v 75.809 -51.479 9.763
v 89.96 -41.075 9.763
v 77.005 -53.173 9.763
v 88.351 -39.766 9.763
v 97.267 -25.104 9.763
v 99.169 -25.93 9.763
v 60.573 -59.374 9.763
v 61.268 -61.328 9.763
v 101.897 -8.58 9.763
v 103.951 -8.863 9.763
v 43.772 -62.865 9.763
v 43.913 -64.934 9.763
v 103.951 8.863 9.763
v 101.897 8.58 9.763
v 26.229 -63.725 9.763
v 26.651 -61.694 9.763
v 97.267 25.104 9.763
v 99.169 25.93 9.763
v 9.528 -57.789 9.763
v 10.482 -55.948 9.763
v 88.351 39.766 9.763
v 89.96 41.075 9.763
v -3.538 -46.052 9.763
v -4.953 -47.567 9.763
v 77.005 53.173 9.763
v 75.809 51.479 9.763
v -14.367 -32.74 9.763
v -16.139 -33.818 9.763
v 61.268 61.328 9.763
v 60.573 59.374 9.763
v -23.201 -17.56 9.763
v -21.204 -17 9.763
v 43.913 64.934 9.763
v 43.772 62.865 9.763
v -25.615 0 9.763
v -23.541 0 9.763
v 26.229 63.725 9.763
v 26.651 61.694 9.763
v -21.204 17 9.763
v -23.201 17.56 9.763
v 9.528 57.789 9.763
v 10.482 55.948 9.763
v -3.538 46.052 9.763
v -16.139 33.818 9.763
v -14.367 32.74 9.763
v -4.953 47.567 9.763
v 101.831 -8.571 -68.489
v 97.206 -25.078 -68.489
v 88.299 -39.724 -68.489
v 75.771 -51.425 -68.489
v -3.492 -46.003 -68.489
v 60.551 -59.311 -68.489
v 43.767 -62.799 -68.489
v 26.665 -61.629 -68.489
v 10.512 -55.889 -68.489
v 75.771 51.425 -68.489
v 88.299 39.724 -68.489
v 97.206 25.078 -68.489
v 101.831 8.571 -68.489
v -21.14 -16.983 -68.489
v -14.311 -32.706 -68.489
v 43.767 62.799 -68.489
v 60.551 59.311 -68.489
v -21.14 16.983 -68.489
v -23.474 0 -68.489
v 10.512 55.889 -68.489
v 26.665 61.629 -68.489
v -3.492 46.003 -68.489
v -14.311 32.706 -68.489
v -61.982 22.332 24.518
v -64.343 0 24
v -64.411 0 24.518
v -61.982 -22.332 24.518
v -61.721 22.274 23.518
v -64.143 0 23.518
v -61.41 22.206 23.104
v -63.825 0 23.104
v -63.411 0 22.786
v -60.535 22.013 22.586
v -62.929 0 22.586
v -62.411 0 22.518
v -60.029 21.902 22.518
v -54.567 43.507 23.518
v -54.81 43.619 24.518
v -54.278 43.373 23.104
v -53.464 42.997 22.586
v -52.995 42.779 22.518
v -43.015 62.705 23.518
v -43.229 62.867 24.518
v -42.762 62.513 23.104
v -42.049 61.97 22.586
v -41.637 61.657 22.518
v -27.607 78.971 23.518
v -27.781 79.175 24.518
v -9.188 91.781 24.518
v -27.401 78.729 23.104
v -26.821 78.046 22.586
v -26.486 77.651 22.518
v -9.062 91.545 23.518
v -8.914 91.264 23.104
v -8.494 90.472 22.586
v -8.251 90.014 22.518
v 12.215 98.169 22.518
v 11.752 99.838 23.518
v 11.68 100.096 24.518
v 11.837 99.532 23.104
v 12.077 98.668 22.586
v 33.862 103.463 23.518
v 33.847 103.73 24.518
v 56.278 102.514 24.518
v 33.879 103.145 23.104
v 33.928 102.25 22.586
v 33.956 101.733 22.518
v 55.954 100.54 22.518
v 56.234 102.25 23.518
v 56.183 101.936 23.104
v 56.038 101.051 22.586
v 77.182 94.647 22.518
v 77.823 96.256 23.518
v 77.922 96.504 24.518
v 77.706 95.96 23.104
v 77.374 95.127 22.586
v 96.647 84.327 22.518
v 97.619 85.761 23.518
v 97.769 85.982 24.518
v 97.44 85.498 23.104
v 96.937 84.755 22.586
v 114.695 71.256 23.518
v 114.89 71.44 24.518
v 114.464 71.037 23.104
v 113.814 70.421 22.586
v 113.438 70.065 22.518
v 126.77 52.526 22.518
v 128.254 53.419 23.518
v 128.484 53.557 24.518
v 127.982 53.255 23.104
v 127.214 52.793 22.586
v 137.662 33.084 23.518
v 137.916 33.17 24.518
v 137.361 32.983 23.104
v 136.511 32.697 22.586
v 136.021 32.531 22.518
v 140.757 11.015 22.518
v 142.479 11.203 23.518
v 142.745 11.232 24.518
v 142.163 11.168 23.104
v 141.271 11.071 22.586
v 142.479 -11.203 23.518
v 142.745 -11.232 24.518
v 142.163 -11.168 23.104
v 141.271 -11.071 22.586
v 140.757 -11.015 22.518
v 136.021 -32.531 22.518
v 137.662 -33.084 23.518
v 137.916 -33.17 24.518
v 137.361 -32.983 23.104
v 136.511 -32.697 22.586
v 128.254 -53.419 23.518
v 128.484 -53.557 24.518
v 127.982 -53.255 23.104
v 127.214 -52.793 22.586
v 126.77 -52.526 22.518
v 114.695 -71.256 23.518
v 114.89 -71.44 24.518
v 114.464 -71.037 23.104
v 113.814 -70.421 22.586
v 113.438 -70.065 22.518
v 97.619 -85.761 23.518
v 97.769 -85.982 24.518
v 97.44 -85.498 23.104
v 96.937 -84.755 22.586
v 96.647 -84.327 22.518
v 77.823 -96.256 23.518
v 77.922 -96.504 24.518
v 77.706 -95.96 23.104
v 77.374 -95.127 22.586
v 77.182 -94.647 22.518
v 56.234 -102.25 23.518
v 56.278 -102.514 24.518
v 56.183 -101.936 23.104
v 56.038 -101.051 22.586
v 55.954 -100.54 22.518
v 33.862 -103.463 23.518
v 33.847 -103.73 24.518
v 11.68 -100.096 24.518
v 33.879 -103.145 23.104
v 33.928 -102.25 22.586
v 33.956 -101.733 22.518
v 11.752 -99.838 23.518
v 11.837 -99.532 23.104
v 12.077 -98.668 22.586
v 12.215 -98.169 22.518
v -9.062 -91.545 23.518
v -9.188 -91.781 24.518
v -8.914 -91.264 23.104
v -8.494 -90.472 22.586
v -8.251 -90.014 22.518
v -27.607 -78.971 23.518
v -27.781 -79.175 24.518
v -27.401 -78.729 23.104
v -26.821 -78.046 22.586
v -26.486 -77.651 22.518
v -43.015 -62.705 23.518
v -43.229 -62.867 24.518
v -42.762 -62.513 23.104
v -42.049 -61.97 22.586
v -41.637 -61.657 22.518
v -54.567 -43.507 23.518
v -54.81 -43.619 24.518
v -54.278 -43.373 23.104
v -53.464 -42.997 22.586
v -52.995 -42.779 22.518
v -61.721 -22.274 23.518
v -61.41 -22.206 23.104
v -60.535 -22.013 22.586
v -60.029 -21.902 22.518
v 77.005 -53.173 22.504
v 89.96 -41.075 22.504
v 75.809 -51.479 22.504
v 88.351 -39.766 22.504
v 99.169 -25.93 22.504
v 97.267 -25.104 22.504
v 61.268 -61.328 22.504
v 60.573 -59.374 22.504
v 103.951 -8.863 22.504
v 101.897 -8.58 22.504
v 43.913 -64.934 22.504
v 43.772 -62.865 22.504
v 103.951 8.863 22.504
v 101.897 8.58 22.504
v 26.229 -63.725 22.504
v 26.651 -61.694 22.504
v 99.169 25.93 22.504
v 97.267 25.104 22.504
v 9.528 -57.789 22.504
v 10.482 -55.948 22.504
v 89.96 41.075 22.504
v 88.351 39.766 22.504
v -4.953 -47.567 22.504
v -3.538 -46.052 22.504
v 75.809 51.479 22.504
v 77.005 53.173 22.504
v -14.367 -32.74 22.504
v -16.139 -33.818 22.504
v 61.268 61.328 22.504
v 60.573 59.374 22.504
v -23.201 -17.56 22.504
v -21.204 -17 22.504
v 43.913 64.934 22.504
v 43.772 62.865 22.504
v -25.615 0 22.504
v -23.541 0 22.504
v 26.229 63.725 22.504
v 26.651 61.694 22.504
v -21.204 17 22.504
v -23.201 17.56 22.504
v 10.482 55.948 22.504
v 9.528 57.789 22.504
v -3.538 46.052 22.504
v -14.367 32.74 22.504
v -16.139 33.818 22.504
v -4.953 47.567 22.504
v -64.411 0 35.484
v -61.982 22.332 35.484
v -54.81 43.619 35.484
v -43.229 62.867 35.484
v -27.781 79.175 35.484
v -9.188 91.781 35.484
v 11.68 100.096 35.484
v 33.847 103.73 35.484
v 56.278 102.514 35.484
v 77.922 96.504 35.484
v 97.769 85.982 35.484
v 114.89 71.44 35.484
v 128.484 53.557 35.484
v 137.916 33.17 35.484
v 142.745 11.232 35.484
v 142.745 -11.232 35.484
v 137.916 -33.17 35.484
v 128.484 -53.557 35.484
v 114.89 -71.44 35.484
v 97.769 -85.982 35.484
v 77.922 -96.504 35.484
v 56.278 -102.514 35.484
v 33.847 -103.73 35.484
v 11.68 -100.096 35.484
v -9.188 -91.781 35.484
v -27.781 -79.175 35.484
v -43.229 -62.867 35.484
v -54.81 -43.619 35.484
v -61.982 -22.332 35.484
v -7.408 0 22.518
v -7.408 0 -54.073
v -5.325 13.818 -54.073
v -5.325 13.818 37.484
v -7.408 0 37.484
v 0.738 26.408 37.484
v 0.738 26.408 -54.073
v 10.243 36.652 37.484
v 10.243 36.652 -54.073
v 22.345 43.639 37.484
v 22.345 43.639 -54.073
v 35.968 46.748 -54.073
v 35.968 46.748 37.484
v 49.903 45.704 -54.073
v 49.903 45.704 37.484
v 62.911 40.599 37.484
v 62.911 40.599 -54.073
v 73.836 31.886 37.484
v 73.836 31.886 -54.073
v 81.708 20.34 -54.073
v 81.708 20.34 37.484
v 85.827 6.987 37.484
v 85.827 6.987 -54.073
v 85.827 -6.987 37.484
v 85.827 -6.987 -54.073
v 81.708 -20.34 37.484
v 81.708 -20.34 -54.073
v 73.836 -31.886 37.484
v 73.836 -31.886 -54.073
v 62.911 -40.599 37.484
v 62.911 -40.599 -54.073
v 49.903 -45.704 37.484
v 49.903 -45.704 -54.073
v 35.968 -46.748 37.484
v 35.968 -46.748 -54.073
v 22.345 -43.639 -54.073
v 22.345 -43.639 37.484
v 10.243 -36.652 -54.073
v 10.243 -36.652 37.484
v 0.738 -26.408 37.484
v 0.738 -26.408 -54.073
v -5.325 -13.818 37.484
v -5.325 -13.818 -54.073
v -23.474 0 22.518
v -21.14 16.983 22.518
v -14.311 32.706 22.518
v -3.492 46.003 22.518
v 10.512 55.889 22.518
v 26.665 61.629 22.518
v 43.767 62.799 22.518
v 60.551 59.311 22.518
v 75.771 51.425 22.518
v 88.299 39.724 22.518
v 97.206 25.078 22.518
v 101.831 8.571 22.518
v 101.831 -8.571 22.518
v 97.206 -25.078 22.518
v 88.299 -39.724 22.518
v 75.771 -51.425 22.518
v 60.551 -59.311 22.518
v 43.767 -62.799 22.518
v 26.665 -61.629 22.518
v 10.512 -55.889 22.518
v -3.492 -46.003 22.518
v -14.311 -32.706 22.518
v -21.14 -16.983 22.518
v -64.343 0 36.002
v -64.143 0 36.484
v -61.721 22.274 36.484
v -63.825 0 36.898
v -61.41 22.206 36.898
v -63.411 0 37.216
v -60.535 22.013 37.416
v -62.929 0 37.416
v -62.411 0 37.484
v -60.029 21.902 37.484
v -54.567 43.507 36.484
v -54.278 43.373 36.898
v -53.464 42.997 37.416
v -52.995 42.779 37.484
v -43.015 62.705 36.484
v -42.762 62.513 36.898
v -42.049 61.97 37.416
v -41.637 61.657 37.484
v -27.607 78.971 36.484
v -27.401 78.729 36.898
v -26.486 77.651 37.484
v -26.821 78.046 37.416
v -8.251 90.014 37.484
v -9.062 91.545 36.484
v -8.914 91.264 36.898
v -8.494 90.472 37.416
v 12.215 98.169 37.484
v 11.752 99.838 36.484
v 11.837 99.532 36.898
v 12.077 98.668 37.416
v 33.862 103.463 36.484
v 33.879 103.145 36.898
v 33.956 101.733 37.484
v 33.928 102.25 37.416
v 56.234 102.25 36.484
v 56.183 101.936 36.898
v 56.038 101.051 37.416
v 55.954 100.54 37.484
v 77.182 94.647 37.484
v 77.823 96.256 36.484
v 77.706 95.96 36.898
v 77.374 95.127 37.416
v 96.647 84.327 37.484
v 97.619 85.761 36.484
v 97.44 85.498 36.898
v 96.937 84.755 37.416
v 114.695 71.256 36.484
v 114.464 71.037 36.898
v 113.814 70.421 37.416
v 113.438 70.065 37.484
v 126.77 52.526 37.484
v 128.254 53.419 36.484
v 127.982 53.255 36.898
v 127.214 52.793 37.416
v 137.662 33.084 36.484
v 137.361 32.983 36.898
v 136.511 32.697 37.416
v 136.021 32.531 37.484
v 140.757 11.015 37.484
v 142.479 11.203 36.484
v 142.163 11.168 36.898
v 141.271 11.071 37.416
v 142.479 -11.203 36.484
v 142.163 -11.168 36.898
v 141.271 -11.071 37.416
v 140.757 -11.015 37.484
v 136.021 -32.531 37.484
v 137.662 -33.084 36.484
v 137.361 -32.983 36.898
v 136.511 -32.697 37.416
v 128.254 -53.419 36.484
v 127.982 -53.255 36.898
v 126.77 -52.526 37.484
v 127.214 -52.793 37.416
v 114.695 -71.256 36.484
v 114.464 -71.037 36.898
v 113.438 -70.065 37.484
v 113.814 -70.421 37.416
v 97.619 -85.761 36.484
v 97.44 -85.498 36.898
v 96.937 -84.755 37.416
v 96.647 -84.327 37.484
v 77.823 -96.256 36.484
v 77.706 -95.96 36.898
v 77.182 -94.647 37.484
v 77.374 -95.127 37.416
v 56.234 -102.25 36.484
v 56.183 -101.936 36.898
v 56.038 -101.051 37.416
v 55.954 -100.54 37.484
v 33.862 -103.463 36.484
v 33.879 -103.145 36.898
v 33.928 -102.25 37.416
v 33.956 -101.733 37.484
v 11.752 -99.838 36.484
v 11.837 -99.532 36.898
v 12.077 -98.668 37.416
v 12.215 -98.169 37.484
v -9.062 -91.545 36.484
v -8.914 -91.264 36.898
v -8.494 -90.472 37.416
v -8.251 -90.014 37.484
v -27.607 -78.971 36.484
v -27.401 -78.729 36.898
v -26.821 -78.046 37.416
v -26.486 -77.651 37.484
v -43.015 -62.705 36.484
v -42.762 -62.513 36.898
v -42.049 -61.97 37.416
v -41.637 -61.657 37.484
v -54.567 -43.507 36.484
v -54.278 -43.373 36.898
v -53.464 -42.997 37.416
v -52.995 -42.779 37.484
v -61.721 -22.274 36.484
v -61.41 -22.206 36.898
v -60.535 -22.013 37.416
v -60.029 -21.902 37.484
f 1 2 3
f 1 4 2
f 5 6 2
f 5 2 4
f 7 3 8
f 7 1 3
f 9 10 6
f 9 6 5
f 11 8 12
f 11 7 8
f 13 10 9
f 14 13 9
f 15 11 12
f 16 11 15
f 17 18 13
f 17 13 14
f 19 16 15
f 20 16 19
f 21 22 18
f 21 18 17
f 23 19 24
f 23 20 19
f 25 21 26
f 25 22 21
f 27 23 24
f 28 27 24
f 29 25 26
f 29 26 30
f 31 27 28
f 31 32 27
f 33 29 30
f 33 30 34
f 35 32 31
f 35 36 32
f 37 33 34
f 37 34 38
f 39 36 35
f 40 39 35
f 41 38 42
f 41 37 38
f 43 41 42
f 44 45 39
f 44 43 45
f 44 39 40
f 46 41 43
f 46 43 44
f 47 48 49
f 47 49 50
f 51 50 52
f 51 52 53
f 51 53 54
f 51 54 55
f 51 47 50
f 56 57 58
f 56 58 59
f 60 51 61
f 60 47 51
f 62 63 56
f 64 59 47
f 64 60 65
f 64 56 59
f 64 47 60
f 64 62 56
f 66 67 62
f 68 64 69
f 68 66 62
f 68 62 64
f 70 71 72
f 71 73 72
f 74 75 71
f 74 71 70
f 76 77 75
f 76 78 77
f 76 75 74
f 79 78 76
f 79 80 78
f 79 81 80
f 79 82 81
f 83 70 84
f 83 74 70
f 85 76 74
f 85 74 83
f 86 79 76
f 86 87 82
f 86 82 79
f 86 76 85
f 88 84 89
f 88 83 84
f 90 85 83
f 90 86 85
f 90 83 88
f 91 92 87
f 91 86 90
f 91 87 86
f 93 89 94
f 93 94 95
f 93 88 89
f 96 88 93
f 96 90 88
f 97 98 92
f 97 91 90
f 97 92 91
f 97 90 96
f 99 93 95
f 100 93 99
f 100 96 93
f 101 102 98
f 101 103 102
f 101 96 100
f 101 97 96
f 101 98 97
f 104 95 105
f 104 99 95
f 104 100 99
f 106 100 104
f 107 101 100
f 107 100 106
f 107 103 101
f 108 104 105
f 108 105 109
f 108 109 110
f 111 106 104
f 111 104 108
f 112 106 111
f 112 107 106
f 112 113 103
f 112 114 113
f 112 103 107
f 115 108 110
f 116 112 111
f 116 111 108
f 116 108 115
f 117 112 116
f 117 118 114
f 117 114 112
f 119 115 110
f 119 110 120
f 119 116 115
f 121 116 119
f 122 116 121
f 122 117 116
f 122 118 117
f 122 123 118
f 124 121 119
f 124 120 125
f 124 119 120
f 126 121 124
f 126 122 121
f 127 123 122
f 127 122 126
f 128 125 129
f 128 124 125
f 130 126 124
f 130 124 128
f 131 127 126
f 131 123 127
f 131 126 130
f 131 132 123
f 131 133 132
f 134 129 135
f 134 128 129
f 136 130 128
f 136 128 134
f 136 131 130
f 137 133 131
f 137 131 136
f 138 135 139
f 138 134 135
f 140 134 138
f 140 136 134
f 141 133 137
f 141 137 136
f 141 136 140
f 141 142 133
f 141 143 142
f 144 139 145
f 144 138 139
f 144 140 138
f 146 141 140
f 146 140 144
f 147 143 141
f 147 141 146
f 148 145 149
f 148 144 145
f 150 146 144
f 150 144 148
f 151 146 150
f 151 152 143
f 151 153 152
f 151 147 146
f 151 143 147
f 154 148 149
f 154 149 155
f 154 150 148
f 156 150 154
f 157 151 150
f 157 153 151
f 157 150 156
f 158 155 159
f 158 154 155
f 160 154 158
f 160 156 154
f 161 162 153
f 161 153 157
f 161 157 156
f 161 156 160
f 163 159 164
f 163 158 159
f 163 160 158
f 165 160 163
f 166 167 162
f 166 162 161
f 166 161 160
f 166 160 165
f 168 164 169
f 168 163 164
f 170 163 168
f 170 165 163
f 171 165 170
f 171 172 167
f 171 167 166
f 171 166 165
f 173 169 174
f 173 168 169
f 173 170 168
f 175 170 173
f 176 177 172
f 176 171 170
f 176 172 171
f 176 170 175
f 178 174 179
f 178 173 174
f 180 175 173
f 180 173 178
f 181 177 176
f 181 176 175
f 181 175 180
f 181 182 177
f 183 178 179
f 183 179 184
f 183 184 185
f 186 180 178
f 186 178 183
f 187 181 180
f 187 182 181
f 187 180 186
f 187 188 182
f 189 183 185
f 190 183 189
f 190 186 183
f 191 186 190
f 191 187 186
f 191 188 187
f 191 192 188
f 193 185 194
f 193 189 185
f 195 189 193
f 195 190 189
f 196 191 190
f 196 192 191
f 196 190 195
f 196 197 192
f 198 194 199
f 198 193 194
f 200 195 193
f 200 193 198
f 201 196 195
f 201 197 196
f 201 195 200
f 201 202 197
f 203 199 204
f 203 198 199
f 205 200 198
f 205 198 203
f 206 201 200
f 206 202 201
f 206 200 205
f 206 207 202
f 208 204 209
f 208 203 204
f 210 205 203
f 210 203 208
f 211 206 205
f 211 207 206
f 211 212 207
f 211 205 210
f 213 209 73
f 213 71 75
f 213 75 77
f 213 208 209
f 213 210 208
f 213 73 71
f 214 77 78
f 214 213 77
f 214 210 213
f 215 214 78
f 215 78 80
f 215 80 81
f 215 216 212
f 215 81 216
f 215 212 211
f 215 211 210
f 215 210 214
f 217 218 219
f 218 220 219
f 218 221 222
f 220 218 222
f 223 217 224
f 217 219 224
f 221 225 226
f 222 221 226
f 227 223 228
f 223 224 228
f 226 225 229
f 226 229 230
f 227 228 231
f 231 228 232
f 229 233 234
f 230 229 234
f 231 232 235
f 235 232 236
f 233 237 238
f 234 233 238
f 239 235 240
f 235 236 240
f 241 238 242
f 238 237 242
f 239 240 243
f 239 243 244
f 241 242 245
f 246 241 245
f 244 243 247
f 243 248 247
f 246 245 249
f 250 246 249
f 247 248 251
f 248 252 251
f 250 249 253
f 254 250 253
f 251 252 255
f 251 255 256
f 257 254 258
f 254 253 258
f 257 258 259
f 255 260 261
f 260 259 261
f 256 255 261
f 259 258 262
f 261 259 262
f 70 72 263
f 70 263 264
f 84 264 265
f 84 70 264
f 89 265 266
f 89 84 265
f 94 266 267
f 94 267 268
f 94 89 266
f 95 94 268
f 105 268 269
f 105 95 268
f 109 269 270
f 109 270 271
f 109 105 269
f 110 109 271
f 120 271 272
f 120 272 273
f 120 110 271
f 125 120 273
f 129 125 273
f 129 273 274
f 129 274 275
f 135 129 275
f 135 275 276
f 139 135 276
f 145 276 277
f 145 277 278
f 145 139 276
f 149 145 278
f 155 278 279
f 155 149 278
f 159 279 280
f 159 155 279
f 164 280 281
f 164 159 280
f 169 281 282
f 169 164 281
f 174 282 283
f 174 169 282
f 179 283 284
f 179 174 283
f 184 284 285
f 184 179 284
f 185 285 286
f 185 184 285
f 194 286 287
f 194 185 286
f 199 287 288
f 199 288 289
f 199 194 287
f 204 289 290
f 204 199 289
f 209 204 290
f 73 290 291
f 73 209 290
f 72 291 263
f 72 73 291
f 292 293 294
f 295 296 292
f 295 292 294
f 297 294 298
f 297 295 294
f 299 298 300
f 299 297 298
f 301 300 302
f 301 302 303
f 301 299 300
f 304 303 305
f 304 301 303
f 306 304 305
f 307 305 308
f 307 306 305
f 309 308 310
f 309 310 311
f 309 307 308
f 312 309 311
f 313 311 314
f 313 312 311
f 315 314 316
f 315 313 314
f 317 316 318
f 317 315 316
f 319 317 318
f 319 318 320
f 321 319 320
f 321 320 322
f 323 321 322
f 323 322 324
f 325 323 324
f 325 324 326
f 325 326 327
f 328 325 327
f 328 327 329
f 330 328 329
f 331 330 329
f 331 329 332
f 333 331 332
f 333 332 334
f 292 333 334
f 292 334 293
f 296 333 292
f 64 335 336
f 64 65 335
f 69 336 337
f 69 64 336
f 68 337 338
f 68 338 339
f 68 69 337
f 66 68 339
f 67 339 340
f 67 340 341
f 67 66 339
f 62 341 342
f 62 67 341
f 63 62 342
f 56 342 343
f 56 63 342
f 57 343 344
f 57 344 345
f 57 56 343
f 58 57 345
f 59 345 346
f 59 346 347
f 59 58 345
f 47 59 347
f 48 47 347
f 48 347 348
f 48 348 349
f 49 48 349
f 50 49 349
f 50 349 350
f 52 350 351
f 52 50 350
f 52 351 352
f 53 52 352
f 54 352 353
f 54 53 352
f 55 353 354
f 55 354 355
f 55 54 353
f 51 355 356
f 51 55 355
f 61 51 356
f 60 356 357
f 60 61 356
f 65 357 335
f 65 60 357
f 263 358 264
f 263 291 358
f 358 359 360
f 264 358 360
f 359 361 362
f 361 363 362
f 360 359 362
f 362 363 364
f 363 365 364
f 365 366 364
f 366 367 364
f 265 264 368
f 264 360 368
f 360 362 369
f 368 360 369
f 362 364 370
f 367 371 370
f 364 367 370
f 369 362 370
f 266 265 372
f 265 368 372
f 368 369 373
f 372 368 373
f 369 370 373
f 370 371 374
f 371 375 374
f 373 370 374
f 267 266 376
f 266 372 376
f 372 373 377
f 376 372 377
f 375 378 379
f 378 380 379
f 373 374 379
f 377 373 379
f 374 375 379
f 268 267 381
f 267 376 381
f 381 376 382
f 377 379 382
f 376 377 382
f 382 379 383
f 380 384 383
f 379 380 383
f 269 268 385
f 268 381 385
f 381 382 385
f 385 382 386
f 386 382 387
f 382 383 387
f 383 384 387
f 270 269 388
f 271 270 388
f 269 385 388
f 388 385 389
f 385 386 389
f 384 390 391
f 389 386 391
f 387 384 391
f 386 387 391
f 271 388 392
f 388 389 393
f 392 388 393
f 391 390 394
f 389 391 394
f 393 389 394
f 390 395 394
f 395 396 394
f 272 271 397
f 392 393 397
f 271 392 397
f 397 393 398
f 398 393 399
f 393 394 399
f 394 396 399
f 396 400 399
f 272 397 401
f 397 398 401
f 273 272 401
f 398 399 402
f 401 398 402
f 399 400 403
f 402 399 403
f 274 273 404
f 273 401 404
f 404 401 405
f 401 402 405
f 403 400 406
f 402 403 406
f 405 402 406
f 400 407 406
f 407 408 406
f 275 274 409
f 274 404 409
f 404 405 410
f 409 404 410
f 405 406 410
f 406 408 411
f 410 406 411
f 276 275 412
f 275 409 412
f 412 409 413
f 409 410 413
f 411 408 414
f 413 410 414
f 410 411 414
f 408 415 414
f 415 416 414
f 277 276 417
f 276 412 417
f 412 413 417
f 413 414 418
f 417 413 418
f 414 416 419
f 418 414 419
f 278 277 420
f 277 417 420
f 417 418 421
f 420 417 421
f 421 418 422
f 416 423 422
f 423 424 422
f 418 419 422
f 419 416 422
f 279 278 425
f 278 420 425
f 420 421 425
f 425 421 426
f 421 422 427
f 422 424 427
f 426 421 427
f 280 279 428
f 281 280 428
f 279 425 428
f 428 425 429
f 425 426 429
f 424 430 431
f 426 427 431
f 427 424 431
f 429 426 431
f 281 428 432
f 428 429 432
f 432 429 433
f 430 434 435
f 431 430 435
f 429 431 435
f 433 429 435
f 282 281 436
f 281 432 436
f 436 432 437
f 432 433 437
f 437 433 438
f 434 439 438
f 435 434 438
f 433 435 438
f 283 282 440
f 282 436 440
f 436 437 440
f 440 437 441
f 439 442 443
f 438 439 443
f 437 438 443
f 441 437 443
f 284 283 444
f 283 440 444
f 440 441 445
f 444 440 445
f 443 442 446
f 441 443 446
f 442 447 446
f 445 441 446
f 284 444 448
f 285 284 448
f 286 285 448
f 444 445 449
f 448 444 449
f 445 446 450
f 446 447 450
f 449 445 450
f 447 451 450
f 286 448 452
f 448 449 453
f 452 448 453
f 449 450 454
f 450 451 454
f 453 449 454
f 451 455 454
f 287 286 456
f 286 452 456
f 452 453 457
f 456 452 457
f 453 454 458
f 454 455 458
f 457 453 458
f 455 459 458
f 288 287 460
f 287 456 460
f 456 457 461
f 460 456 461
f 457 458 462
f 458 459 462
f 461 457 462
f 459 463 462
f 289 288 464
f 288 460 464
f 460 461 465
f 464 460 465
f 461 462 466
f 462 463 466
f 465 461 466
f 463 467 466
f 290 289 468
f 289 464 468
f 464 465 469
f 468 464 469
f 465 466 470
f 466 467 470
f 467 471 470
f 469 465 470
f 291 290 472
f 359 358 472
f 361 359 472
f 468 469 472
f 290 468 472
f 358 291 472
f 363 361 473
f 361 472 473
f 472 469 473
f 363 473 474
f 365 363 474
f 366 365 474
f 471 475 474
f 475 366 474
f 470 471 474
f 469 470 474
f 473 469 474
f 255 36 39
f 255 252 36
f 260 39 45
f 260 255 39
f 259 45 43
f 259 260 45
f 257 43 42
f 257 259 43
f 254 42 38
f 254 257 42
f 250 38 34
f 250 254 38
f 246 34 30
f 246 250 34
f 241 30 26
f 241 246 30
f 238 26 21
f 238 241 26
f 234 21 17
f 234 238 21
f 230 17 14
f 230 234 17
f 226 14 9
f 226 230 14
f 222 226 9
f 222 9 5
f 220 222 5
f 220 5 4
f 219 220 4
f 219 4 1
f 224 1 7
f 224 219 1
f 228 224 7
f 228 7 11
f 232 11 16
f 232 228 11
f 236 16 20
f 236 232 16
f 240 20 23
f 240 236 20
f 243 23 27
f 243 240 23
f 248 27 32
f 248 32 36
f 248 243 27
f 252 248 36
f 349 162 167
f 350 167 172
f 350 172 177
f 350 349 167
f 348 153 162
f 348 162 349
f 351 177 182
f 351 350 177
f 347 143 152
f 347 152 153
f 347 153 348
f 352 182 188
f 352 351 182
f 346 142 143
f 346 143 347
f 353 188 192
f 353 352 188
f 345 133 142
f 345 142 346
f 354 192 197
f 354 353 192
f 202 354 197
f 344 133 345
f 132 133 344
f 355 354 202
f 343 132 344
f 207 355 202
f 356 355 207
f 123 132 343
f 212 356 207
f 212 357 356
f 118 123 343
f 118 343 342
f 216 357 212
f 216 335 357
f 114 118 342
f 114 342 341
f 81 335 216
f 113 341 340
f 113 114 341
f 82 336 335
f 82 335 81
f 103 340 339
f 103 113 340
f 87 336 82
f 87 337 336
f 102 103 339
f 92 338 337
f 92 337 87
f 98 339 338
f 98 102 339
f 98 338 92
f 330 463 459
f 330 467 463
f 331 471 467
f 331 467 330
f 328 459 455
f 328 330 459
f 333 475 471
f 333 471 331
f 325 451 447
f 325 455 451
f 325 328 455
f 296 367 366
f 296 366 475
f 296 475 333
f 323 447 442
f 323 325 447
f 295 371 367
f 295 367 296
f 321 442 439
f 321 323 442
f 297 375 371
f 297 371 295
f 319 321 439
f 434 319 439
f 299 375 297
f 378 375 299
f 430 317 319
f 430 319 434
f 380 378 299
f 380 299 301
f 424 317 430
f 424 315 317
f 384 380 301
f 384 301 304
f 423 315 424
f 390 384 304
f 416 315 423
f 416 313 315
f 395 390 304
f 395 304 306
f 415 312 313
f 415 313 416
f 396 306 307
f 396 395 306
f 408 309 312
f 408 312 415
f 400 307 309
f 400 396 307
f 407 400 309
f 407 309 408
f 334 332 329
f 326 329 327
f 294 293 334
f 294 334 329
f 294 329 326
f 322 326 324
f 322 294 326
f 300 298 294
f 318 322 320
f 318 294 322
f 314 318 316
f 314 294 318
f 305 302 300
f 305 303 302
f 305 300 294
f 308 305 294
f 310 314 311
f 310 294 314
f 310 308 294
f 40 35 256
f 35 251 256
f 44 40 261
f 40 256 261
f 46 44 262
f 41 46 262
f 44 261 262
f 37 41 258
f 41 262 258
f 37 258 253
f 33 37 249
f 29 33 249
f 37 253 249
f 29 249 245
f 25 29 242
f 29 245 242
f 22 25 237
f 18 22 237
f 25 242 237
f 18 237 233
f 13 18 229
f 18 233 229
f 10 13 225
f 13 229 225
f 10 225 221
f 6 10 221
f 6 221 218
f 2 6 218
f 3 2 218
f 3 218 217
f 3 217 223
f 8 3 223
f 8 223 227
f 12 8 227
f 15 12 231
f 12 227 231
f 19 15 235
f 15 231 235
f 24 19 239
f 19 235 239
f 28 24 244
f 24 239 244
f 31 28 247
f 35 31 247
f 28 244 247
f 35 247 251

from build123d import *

# Parameters (mm, degrees)
F0_W = 16.0665810108
F0_H = 76.591335237
F1_W = 2.0740795881
F1_H = 12.7407778054
F3_R = 2
F4_R = 2


with BuildPart() as f2:
    # F0 (on Front) → F2 (revolve)
    with BuildSketch(Plane.XZ):
        Polygon((-23.4742984176, 22.5179940462), (-7.4077174067, 22.5179940462), (-7.4077174067, 37.4841094017), (-64.4110590219, 37.4841094017), (-64.4110590219, 22.5179940462), align=None)
        with Locations((-15.4410079122, -15.7776735723)):
            Rectangle(F0_W, F0_H)
        Polygon((39.4714772701, -54.0733411908), (-7.4077174067, -54.0733411908), (-23.4742984176, -54.0733411908), (-23.4742984176, -68.4892460704), (39.4714772701, -68.4892460704), align=None)
    revolve(axis=Axis((39.4714772701, 0, -61.2812936306), (0, 0, -1)))

    # F3
    f3_edges = [f2.edges().sort_by_distance(p)[0] for p in [
        (143.354014, 0, 22.517994),
    ]]
    fillet(f3_edges, radius=F3_R)

    # F4
    f4_edges = [f2.edges().sort_by_distance(p)[0] for p in [
        (143.354014, 0, 37.484109),
    ]]
    fillet(f4_edges, radius=F4_R)


with BuildPart() as f2b:
    # F1 (on Front) → F2, piece 2 (revolve)
    with BuildSketch(Plane.XZ):
        with Locations((-24.5777135715, 16.1331398413)):
            Rectangle(F1_W, F1_H)
    revolve(axis=Axis((39.4714772701, 0, -61.2812936306), (0, 0, -1)))


solid = Compound([f2.part, f2b.part])
